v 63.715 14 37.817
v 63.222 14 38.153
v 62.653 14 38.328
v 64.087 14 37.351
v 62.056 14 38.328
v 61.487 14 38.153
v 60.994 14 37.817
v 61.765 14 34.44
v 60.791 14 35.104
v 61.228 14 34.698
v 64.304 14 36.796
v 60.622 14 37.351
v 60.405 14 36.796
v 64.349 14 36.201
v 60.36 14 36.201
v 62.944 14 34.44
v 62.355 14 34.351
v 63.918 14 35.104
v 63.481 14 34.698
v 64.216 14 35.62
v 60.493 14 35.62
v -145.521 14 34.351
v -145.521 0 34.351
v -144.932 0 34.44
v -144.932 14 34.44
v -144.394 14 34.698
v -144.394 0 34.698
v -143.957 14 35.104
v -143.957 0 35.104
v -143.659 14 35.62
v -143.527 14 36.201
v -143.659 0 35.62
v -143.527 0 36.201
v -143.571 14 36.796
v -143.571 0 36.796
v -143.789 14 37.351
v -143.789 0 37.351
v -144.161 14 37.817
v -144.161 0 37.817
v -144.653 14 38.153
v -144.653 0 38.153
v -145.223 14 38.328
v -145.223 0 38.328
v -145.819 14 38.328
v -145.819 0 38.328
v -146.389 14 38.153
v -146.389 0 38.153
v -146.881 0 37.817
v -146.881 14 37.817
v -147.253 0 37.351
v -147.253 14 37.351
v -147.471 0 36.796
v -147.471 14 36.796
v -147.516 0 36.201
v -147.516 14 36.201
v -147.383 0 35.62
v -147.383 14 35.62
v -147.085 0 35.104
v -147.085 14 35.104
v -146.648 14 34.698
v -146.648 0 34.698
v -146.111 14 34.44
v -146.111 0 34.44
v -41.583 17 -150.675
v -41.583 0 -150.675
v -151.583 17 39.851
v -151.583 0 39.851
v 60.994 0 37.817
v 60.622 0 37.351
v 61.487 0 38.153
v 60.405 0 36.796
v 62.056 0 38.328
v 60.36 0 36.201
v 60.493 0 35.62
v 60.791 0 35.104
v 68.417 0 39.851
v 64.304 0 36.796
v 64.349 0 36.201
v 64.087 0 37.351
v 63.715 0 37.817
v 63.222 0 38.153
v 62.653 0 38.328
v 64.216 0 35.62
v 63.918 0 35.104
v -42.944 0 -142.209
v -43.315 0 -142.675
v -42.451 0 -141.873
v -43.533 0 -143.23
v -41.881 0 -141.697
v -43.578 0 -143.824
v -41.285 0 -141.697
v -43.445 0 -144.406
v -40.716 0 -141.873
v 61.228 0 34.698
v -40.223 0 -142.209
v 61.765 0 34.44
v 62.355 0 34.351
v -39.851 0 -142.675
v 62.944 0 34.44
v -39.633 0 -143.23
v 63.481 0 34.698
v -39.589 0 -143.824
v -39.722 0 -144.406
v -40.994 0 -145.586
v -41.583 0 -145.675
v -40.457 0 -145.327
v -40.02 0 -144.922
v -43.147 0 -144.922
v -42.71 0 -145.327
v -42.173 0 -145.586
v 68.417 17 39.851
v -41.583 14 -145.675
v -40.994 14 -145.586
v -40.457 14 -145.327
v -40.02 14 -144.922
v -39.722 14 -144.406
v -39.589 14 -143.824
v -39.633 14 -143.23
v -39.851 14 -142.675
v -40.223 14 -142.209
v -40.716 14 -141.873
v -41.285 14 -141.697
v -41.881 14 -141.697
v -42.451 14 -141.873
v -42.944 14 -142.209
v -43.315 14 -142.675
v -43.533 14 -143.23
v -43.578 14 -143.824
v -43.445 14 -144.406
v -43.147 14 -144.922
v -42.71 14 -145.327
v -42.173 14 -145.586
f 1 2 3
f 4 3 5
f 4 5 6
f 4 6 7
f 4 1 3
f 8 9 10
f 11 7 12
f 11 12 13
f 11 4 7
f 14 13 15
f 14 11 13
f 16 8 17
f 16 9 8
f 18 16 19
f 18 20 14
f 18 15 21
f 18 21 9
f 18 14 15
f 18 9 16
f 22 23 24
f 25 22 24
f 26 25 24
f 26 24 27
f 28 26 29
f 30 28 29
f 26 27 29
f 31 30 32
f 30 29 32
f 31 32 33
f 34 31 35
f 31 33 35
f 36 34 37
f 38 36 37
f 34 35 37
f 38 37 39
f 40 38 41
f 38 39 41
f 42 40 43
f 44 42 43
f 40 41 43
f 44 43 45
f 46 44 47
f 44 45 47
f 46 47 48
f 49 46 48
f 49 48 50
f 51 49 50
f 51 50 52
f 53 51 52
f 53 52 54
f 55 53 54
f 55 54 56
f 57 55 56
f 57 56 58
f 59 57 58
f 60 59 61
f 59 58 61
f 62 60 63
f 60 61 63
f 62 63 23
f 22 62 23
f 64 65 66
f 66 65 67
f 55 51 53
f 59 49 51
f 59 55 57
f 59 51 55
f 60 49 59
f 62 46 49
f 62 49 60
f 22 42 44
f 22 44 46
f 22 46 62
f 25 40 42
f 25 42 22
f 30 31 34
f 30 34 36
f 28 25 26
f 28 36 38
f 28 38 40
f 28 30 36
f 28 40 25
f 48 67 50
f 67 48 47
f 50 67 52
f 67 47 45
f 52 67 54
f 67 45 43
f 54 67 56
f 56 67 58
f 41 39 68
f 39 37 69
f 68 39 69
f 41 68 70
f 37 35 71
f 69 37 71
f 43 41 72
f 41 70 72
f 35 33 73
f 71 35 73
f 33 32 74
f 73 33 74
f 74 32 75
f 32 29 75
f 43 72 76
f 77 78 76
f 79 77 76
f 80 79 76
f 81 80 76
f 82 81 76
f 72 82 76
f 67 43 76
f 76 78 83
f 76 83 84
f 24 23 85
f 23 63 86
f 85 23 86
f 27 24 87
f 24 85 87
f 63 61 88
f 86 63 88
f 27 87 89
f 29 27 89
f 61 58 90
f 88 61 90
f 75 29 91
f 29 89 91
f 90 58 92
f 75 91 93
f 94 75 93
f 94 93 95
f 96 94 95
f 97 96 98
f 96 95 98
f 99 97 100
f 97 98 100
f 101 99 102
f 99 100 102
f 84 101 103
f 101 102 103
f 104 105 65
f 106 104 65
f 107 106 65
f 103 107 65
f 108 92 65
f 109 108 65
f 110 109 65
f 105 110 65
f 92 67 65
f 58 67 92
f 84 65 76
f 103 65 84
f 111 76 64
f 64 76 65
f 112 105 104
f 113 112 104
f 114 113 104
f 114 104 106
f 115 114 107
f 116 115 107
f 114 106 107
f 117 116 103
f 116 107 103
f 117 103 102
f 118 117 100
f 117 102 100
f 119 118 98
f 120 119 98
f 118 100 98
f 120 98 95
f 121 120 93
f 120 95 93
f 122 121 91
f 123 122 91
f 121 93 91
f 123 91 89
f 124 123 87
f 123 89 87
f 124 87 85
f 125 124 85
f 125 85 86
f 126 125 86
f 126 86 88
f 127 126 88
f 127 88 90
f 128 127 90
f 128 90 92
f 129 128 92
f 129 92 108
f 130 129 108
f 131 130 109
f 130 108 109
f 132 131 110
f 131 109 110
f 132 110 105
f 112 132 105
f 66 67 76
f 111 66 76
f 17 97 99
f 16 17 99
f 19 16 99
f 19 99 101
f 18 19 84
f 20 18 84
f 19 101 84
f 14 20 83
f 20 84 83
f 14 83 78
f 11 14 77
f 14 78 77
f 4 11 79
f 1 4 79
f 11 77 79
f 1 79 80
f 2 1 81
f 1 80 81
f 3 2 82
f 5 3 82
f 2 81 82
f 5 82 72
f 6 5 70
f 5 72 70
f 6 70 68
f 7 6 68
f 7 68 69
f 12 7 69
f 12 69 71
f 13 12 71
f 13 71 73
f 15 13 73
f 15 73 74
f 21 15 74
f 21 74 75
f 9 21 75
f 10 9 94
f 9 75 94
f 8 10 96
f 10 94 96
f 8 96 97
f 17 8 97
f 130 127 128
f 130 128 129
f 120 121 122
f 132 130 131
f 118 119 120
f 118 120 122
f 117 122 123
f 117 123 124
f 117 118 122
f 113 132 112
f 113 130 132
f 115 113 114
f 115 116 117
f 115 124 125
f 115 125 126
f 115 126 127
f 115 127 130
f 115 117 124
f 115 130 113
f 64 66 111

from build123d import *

# Parameters (mm, degrees)
BOSS_EXTRUDE1_DEPTH = 17
SKETCH3_R           = 2
CUT_EXTRUDE2_DEPTH  = 14


with BuildPart() as part:
    # Sketch2 → Boss-Extrude1 (new body)
    with BuildSketch(Plane(origin=(0, 0, 0), x_dir=(1, 0, 0), z_dir=(0, 1, 0))):
        Polygon((-41.583286951, 150.67482391), (-151.583286951, -39.850764923), (68.416713049, -39.850764923), align=None)
    extrude(amount=BOSS_EXTRUDE1_DEPTH)

    # Sketch3 → Cut-Extrude2 (cut)
    with BuildSketch(Plane.XZ):
        with Locations(Location((-145.521109124, 36.350764923, 0), (0, 0, 270))):
            Circle(SKETCH3_R)
        with Locations(Location((62.354535223, 36.350764923, 0), (0, 0, 270))):
            Circle(SKETCH3_R)
        with Locations(Location((-41.583286951, -143.67482391, 0), (0, 0, 270))):
            Circle(SKETCH3_R)
    extrude(amount=-CUT_EXTRUDE2_DEPTH, mode=Mode.SUBTRACT)


solid = part.part
